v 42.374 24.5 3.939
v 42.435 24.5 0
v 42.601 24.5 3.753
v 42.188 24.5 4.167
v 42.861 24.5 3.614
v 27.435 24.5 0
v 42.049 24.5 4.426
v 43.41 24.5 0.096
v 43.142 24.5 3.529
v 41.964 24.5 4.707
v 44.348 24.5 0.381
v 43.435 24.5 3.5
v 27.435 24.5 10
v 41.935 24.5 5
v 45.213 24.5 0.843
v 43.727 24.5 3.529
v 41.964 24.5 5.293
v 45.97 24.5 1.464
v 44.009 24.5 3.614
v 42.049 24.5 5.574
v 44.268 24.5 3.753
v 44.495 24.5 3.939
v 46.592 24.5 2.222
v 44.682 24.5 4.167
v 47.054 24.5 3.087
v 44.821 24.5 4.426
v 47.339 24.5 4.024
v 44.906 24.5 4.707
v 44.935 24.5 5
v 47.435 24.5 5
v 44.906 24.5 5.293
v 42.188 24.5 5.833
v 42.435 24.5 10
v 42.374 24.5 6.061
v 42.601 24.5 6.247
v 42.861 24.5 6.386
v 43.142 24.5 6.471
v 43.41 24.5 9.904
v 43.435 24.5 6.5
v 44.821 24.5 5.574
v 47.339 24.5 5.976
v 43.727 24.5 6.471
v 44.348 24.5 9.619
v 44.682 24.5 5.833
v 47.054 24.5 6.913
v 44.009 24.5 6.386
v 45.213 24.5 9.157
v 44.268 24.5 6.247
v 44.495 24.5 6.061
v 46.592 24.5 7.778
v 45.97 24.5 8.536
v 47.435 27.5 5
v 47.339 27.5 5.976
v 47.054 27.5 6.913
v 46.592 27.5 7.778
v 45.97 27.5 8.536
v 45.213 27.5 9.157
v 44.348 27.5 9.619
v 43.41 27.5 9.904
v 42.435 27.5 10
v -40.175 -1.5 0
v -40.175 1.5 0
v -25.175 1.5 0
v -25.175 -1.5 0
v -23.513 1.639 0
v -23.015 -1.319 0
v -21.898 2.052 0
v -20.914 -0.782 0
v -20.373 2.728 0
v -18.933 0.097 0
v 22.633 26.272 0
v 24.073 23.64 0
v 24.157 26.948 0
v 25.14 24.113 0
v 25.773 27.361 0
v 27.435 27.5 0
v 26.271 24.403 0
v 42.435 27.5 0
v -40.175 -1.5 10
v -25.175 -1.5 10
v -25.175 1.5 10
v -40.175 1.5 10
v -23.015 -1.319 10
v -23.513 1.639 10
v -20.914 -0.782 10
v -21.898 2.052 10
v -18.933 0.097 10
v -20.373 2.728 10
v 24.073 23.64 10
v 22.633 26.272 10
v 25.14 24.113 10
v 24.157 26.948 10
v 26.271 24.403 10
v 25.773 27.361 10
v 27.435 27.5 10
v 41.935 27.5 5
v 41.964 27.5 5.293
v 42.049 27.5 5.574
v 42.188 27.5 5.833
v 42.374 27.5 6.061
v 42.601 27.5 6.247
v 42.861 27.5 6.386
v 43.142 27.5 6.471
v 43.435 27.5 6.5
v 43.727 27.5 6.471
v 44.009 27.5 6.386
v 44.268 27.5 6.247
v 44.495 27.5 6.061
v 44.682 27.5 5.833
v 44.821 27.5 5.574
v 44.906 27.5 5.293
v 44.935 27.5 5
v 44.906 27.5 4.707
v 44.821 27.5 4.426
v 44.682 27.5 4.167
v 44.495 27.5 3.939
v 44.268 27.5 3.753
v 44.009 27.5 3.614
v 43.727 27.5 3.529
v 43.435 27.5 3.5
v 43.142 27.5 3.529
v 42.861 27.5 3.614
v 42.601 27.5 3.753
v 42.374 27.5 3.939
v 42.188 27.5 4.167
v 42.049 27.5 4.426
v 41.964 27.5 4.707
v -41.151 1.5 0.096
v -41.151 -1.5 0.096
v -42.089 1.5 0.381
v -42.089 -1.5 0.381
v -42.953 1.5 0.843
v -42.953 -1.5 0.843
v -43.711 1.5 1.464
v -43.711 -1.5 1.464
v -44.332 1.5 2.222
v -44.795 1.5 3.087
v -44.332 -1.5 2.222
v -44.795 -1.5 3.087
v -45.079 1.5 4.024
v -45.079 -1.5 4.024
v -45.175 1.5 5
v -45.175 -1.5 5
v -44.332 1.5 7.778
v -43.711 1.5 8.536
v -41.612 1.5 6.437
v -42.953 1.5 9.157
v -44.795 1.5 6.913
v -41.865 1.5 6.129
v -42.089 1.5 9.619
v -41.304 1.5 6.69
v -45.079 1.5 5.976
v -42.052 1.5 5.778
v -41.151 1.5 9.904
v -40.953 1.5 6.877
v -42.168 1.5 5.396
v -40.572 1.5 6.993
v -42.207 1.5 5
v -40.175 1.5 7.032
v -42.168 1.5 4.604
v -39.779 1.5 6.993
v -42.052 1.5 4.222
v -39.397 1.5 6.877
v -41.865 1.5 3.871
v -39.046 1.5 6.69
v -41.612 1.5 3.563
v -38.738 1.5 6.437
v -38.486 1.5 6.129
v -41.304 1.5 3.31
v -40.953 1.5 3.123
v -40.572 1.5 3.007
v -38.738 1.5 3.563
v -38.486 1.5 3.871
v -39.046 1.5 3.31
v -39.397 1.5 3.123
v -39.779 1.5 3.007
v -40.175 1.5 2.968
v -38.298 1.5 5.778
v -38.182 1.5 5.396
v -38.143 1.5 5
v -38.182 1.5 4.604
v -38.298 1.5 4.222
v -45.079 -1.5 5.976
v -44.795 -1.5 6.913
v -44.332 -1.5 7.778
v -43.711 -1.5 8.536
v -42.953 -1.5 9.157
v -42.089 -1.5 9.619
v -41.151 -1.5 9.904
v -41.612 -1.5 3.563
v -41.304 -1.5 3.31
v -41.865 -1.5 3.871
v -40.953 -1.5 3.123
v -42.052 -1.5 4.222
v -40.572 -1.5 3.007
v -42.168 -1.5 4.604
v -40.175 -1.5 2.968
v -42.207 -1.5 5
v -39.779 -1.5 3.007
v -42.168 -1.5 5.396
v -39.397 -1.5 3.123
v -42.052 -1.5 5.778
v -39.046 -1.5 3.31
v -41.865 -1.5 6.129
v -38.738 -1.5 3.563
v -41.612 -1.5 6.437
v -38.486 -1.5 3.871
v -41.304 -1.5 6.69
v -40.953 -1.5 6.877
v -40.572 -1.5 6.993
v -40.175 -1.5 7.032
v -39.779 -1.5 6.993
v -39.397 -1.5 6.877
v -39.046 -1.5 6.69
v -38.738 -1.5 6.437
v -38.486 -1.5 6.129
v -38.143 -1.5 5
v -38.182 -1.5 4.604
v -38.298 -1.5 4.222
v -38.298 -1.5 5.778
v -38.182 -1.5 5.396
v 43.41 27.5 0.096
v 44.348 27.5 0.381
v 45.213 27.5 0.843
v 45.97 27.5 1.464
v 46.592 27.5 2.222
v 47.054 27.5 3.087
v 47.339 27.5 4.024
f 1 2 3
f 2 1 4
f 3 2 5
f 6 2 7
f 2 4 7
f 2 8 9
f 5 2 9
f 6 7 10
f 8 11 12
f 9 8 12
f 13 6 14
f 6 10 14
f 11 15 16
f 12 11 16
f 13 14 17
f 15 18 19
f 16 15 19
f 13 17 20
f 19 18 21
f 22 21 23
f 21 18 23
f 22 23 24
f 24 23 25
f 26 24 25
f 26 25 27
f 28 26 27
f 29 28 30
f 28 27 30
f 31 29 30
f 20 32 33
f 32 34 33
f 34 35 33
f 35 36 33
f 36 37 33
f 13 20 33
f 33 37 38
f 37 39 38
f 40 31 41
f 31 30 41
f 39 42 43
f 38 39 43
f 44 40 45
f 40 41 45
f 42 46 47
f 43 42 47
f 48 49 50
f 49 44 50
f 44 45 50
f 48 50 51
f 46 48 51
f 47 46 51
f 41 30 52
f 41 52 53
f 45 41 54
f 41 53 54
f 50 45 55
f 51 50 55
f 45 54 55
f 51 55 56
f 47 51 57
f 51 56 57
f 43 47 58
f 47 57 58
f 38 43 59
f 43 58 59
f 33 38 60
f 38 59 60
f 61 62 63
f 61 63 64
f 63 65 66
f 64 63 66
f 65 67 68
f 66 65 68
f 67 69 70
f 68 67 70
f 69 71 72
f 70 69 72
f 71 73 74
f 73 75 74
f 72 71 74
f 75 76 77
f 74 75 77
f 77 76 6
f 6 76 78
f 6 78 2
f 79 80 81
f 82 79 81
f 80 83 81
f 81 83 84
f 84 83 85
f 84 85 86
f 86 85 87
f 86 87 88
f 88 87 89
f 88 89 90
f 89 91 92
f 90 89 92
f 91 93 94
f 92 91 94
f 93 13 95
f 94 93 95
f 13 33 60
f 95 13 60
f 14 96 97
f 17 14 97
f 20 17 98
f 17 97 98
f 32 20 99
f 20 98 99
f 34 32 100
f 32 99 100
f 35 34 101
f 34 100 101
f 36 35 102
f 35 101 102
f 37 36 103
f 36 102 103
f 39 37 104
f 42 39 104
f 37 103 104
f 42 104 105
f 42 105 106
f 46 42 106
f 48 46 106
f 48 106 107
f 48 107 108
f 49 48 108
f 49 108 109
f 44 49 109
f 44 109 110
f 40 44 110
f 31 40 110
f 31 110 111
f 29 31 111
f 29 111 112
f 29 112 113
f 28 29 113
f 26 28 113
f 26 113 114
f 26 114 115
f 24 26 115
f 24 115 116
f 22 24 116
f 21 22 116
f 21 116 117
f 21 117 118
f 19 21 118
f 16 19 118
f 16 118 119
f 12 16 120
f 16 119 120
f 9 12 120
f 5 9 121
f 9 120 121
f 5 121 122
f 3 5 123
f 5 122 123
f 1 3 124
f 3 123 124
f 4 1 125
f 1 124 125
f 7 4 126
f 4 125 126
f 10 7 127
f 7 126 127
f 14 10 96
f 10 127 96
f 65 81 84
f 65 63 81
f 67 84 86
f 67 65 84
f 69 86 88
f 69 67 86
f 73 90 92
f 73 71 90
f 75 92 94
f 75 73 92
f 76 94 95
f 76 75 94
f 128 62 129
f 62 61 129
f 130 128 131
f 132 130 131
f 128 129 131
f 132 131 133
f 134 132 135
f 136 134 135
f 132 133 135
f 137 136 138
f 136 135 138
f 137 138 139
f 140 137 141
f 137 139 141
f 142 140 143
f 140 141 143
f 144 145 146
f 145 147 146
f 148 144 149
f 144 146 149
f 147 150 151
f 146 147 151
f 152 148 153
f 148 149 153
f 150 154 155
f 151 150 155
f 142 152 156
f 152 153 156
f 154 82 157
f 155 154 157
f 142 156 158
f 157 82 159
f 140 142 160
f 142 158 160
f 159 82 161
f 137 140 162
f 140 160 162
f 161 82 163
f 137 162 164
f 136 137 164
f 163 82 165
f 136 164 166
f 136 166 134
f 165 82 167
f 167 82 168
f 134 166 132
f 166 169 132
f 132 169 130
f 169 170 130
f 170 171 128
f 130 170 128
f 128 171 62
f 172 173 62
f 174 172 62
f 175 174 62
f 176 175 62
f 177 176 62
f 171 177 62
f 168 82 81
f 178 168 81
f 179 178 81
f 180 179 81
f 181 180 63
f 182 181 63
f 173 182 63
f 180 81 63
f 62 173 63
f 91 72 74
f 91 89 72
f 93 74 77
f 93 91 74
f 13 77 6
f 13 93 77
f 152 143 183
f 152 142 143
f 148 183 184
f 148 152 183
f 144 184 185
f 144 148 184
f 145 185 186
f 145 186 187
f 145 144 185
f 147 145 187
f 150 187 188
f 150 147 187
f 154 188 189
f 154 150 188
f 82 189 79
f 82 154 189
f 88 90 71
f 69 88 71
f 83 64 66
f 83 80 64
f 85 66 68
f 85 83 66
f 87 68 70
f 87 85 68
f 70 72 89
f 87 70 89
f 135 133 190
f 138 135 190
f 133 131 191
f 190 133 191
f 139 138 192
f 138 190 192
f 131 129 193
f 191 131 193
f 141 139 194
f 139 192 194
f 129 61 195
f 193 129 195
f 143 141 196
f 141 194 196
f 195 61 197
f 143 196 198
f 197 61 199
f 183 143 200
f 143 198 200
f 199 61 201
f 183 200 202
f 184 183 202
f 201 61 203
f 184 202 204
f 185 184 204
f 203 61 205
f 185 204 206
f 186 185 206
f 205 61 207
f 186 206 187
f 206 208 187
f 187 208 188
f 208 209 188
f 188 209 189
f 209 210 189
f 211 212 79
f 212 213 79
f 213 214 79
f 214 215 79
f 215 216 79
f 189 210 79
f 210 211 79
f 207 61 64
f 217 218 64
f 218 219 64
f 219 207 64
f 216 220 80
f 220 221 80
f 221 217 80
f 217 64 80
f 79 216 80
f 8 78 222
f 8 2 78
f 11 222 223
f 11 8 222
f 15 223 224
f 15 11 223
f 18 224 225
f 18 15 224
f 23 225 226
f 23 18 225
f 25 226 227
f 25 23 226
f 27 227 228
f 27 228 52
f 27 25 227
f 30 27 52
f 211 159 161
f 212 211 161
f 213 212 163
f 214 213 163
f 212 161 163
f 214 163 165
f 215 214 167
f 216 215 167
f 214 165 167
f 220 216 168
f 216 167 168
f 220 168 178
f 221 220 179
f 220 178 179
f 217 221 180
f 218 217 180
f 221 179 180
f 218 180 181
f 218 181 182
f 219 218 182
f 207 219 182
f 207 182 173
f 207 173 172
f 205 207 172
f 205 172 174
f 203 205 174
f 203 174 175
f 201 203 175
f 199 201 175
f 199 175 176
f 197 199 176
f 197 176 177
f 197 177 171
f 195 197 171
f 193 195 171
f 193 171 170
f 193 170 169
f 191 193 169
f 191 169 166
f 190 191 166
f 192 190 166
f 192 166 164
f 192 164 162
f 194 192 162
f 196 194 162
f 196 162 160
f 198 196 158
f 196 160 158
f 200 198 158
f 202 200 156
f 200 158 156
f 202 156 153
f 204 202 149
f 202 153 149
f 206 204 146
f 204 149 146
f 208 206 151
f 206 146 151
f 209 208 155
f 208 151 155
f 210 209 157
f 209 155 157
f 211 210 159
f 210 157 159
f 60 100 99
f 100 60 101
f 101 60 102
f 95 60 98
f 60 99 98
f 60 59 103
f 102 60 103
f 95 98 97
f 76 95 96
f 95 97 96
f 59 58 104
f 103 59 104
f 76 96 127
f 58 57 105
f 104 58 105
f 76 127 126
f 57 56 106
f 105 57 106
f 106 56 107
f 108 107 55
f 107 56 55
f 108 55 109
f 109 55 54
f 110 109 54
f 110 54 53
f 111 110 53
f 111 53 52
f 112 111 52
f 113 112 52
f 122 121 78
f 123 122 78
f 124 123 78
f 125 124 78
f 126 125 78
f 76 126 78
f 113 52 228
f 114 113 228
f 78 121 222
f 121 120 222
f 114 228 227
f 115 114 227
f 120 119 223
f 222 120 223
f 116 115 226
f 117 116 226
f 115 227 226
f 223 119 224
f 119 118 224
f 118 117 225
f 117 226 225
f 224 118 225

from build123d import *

# Parameters (mm, degrees)
SKETCH3_W          = 10
SKETCH3_H          = 3
SKETCH5_R          = 1.5
CUT_EXTRUDE2_DEPTH = 57.489403968
SKETCH2_R          = 2.032
CUT_EXTRUDE1_DEPTH = 56.009569719
FILLET1_R          = 5


with BuildPart() as part:
    # Sweep1: sweep along a path in Sketch4
    with BuildLine(Plane.XY) as sweep1_path:
        Line((-45.175097276, 1.5), (-25.175097276, 1.5))
        ThreePointArc((-25.175097276, 1.5), (-22.696809318, 1.811961561), (-20.373147477, 2.72838224))
        Line((-20.373147477, 2.72838224), (22.632771246, 26.27161776))
        ThreePointArc((22.632771246, 26.27161776), (24.956433088, 27.188038439), (27.434721046, 27.5))
        Line((27.434721046, 27.5), (47.434721046, 27.5))
    # Sketch3 → Sweep1 (sweep)
    with BuildSketch(Plane.ZY.offset(45.175097276)):
        with Locations((5, 0)):
            Rectangle(SKETCH3_W, SKETCH3_H)
    sweep(path=sweep1_path.line)

    # Sketch5 → Cut-Extrude2 (cut, through all)
    with BuildSketch(Plane(origin=(0, 27.5, 0), x_dir=(1, 0, 0), z_dir=(0, 1, 0))):
        with Locations(Location((43.434721046, -5, 0), (0, 0, 180))):
            Circle(SKETCH5_R)
    extrude(amount=-CUT_EXTRUDE2_DEPTH, mode=Mode.SUBTRACT)

    # Sketch2 → Cut-Extrude1 (cut, through all)
    with BuildSketch(Plane(origin=(0, 1.5, 0), x_dir=(1, 0, 0), z_dir=(0, 1, 0))):
        with Locations(Location((-40.175097276, -5, 0), (0, 0, 270))):
            Circle(SKETCH2_R)
    extrude(amount=-CUT_EXTRUDE1_DEPTH, mode=Mode.SUBTRACT)

    # Fillet1
    fillet1_edges = [part.edges().sort_by_distance(p)[0] for p in [
        (47.434721046, 26, 0),
        (47.434721046, 26, 10),
        (-45.175097276, 0, 10),
        (-45.175097276, 0, 0),
    ]]
    fillet(fillet1_edges, radius=FILLET1_R - 0.0001)  # a hair under: the kernel refuses the full size


solid = part.part
